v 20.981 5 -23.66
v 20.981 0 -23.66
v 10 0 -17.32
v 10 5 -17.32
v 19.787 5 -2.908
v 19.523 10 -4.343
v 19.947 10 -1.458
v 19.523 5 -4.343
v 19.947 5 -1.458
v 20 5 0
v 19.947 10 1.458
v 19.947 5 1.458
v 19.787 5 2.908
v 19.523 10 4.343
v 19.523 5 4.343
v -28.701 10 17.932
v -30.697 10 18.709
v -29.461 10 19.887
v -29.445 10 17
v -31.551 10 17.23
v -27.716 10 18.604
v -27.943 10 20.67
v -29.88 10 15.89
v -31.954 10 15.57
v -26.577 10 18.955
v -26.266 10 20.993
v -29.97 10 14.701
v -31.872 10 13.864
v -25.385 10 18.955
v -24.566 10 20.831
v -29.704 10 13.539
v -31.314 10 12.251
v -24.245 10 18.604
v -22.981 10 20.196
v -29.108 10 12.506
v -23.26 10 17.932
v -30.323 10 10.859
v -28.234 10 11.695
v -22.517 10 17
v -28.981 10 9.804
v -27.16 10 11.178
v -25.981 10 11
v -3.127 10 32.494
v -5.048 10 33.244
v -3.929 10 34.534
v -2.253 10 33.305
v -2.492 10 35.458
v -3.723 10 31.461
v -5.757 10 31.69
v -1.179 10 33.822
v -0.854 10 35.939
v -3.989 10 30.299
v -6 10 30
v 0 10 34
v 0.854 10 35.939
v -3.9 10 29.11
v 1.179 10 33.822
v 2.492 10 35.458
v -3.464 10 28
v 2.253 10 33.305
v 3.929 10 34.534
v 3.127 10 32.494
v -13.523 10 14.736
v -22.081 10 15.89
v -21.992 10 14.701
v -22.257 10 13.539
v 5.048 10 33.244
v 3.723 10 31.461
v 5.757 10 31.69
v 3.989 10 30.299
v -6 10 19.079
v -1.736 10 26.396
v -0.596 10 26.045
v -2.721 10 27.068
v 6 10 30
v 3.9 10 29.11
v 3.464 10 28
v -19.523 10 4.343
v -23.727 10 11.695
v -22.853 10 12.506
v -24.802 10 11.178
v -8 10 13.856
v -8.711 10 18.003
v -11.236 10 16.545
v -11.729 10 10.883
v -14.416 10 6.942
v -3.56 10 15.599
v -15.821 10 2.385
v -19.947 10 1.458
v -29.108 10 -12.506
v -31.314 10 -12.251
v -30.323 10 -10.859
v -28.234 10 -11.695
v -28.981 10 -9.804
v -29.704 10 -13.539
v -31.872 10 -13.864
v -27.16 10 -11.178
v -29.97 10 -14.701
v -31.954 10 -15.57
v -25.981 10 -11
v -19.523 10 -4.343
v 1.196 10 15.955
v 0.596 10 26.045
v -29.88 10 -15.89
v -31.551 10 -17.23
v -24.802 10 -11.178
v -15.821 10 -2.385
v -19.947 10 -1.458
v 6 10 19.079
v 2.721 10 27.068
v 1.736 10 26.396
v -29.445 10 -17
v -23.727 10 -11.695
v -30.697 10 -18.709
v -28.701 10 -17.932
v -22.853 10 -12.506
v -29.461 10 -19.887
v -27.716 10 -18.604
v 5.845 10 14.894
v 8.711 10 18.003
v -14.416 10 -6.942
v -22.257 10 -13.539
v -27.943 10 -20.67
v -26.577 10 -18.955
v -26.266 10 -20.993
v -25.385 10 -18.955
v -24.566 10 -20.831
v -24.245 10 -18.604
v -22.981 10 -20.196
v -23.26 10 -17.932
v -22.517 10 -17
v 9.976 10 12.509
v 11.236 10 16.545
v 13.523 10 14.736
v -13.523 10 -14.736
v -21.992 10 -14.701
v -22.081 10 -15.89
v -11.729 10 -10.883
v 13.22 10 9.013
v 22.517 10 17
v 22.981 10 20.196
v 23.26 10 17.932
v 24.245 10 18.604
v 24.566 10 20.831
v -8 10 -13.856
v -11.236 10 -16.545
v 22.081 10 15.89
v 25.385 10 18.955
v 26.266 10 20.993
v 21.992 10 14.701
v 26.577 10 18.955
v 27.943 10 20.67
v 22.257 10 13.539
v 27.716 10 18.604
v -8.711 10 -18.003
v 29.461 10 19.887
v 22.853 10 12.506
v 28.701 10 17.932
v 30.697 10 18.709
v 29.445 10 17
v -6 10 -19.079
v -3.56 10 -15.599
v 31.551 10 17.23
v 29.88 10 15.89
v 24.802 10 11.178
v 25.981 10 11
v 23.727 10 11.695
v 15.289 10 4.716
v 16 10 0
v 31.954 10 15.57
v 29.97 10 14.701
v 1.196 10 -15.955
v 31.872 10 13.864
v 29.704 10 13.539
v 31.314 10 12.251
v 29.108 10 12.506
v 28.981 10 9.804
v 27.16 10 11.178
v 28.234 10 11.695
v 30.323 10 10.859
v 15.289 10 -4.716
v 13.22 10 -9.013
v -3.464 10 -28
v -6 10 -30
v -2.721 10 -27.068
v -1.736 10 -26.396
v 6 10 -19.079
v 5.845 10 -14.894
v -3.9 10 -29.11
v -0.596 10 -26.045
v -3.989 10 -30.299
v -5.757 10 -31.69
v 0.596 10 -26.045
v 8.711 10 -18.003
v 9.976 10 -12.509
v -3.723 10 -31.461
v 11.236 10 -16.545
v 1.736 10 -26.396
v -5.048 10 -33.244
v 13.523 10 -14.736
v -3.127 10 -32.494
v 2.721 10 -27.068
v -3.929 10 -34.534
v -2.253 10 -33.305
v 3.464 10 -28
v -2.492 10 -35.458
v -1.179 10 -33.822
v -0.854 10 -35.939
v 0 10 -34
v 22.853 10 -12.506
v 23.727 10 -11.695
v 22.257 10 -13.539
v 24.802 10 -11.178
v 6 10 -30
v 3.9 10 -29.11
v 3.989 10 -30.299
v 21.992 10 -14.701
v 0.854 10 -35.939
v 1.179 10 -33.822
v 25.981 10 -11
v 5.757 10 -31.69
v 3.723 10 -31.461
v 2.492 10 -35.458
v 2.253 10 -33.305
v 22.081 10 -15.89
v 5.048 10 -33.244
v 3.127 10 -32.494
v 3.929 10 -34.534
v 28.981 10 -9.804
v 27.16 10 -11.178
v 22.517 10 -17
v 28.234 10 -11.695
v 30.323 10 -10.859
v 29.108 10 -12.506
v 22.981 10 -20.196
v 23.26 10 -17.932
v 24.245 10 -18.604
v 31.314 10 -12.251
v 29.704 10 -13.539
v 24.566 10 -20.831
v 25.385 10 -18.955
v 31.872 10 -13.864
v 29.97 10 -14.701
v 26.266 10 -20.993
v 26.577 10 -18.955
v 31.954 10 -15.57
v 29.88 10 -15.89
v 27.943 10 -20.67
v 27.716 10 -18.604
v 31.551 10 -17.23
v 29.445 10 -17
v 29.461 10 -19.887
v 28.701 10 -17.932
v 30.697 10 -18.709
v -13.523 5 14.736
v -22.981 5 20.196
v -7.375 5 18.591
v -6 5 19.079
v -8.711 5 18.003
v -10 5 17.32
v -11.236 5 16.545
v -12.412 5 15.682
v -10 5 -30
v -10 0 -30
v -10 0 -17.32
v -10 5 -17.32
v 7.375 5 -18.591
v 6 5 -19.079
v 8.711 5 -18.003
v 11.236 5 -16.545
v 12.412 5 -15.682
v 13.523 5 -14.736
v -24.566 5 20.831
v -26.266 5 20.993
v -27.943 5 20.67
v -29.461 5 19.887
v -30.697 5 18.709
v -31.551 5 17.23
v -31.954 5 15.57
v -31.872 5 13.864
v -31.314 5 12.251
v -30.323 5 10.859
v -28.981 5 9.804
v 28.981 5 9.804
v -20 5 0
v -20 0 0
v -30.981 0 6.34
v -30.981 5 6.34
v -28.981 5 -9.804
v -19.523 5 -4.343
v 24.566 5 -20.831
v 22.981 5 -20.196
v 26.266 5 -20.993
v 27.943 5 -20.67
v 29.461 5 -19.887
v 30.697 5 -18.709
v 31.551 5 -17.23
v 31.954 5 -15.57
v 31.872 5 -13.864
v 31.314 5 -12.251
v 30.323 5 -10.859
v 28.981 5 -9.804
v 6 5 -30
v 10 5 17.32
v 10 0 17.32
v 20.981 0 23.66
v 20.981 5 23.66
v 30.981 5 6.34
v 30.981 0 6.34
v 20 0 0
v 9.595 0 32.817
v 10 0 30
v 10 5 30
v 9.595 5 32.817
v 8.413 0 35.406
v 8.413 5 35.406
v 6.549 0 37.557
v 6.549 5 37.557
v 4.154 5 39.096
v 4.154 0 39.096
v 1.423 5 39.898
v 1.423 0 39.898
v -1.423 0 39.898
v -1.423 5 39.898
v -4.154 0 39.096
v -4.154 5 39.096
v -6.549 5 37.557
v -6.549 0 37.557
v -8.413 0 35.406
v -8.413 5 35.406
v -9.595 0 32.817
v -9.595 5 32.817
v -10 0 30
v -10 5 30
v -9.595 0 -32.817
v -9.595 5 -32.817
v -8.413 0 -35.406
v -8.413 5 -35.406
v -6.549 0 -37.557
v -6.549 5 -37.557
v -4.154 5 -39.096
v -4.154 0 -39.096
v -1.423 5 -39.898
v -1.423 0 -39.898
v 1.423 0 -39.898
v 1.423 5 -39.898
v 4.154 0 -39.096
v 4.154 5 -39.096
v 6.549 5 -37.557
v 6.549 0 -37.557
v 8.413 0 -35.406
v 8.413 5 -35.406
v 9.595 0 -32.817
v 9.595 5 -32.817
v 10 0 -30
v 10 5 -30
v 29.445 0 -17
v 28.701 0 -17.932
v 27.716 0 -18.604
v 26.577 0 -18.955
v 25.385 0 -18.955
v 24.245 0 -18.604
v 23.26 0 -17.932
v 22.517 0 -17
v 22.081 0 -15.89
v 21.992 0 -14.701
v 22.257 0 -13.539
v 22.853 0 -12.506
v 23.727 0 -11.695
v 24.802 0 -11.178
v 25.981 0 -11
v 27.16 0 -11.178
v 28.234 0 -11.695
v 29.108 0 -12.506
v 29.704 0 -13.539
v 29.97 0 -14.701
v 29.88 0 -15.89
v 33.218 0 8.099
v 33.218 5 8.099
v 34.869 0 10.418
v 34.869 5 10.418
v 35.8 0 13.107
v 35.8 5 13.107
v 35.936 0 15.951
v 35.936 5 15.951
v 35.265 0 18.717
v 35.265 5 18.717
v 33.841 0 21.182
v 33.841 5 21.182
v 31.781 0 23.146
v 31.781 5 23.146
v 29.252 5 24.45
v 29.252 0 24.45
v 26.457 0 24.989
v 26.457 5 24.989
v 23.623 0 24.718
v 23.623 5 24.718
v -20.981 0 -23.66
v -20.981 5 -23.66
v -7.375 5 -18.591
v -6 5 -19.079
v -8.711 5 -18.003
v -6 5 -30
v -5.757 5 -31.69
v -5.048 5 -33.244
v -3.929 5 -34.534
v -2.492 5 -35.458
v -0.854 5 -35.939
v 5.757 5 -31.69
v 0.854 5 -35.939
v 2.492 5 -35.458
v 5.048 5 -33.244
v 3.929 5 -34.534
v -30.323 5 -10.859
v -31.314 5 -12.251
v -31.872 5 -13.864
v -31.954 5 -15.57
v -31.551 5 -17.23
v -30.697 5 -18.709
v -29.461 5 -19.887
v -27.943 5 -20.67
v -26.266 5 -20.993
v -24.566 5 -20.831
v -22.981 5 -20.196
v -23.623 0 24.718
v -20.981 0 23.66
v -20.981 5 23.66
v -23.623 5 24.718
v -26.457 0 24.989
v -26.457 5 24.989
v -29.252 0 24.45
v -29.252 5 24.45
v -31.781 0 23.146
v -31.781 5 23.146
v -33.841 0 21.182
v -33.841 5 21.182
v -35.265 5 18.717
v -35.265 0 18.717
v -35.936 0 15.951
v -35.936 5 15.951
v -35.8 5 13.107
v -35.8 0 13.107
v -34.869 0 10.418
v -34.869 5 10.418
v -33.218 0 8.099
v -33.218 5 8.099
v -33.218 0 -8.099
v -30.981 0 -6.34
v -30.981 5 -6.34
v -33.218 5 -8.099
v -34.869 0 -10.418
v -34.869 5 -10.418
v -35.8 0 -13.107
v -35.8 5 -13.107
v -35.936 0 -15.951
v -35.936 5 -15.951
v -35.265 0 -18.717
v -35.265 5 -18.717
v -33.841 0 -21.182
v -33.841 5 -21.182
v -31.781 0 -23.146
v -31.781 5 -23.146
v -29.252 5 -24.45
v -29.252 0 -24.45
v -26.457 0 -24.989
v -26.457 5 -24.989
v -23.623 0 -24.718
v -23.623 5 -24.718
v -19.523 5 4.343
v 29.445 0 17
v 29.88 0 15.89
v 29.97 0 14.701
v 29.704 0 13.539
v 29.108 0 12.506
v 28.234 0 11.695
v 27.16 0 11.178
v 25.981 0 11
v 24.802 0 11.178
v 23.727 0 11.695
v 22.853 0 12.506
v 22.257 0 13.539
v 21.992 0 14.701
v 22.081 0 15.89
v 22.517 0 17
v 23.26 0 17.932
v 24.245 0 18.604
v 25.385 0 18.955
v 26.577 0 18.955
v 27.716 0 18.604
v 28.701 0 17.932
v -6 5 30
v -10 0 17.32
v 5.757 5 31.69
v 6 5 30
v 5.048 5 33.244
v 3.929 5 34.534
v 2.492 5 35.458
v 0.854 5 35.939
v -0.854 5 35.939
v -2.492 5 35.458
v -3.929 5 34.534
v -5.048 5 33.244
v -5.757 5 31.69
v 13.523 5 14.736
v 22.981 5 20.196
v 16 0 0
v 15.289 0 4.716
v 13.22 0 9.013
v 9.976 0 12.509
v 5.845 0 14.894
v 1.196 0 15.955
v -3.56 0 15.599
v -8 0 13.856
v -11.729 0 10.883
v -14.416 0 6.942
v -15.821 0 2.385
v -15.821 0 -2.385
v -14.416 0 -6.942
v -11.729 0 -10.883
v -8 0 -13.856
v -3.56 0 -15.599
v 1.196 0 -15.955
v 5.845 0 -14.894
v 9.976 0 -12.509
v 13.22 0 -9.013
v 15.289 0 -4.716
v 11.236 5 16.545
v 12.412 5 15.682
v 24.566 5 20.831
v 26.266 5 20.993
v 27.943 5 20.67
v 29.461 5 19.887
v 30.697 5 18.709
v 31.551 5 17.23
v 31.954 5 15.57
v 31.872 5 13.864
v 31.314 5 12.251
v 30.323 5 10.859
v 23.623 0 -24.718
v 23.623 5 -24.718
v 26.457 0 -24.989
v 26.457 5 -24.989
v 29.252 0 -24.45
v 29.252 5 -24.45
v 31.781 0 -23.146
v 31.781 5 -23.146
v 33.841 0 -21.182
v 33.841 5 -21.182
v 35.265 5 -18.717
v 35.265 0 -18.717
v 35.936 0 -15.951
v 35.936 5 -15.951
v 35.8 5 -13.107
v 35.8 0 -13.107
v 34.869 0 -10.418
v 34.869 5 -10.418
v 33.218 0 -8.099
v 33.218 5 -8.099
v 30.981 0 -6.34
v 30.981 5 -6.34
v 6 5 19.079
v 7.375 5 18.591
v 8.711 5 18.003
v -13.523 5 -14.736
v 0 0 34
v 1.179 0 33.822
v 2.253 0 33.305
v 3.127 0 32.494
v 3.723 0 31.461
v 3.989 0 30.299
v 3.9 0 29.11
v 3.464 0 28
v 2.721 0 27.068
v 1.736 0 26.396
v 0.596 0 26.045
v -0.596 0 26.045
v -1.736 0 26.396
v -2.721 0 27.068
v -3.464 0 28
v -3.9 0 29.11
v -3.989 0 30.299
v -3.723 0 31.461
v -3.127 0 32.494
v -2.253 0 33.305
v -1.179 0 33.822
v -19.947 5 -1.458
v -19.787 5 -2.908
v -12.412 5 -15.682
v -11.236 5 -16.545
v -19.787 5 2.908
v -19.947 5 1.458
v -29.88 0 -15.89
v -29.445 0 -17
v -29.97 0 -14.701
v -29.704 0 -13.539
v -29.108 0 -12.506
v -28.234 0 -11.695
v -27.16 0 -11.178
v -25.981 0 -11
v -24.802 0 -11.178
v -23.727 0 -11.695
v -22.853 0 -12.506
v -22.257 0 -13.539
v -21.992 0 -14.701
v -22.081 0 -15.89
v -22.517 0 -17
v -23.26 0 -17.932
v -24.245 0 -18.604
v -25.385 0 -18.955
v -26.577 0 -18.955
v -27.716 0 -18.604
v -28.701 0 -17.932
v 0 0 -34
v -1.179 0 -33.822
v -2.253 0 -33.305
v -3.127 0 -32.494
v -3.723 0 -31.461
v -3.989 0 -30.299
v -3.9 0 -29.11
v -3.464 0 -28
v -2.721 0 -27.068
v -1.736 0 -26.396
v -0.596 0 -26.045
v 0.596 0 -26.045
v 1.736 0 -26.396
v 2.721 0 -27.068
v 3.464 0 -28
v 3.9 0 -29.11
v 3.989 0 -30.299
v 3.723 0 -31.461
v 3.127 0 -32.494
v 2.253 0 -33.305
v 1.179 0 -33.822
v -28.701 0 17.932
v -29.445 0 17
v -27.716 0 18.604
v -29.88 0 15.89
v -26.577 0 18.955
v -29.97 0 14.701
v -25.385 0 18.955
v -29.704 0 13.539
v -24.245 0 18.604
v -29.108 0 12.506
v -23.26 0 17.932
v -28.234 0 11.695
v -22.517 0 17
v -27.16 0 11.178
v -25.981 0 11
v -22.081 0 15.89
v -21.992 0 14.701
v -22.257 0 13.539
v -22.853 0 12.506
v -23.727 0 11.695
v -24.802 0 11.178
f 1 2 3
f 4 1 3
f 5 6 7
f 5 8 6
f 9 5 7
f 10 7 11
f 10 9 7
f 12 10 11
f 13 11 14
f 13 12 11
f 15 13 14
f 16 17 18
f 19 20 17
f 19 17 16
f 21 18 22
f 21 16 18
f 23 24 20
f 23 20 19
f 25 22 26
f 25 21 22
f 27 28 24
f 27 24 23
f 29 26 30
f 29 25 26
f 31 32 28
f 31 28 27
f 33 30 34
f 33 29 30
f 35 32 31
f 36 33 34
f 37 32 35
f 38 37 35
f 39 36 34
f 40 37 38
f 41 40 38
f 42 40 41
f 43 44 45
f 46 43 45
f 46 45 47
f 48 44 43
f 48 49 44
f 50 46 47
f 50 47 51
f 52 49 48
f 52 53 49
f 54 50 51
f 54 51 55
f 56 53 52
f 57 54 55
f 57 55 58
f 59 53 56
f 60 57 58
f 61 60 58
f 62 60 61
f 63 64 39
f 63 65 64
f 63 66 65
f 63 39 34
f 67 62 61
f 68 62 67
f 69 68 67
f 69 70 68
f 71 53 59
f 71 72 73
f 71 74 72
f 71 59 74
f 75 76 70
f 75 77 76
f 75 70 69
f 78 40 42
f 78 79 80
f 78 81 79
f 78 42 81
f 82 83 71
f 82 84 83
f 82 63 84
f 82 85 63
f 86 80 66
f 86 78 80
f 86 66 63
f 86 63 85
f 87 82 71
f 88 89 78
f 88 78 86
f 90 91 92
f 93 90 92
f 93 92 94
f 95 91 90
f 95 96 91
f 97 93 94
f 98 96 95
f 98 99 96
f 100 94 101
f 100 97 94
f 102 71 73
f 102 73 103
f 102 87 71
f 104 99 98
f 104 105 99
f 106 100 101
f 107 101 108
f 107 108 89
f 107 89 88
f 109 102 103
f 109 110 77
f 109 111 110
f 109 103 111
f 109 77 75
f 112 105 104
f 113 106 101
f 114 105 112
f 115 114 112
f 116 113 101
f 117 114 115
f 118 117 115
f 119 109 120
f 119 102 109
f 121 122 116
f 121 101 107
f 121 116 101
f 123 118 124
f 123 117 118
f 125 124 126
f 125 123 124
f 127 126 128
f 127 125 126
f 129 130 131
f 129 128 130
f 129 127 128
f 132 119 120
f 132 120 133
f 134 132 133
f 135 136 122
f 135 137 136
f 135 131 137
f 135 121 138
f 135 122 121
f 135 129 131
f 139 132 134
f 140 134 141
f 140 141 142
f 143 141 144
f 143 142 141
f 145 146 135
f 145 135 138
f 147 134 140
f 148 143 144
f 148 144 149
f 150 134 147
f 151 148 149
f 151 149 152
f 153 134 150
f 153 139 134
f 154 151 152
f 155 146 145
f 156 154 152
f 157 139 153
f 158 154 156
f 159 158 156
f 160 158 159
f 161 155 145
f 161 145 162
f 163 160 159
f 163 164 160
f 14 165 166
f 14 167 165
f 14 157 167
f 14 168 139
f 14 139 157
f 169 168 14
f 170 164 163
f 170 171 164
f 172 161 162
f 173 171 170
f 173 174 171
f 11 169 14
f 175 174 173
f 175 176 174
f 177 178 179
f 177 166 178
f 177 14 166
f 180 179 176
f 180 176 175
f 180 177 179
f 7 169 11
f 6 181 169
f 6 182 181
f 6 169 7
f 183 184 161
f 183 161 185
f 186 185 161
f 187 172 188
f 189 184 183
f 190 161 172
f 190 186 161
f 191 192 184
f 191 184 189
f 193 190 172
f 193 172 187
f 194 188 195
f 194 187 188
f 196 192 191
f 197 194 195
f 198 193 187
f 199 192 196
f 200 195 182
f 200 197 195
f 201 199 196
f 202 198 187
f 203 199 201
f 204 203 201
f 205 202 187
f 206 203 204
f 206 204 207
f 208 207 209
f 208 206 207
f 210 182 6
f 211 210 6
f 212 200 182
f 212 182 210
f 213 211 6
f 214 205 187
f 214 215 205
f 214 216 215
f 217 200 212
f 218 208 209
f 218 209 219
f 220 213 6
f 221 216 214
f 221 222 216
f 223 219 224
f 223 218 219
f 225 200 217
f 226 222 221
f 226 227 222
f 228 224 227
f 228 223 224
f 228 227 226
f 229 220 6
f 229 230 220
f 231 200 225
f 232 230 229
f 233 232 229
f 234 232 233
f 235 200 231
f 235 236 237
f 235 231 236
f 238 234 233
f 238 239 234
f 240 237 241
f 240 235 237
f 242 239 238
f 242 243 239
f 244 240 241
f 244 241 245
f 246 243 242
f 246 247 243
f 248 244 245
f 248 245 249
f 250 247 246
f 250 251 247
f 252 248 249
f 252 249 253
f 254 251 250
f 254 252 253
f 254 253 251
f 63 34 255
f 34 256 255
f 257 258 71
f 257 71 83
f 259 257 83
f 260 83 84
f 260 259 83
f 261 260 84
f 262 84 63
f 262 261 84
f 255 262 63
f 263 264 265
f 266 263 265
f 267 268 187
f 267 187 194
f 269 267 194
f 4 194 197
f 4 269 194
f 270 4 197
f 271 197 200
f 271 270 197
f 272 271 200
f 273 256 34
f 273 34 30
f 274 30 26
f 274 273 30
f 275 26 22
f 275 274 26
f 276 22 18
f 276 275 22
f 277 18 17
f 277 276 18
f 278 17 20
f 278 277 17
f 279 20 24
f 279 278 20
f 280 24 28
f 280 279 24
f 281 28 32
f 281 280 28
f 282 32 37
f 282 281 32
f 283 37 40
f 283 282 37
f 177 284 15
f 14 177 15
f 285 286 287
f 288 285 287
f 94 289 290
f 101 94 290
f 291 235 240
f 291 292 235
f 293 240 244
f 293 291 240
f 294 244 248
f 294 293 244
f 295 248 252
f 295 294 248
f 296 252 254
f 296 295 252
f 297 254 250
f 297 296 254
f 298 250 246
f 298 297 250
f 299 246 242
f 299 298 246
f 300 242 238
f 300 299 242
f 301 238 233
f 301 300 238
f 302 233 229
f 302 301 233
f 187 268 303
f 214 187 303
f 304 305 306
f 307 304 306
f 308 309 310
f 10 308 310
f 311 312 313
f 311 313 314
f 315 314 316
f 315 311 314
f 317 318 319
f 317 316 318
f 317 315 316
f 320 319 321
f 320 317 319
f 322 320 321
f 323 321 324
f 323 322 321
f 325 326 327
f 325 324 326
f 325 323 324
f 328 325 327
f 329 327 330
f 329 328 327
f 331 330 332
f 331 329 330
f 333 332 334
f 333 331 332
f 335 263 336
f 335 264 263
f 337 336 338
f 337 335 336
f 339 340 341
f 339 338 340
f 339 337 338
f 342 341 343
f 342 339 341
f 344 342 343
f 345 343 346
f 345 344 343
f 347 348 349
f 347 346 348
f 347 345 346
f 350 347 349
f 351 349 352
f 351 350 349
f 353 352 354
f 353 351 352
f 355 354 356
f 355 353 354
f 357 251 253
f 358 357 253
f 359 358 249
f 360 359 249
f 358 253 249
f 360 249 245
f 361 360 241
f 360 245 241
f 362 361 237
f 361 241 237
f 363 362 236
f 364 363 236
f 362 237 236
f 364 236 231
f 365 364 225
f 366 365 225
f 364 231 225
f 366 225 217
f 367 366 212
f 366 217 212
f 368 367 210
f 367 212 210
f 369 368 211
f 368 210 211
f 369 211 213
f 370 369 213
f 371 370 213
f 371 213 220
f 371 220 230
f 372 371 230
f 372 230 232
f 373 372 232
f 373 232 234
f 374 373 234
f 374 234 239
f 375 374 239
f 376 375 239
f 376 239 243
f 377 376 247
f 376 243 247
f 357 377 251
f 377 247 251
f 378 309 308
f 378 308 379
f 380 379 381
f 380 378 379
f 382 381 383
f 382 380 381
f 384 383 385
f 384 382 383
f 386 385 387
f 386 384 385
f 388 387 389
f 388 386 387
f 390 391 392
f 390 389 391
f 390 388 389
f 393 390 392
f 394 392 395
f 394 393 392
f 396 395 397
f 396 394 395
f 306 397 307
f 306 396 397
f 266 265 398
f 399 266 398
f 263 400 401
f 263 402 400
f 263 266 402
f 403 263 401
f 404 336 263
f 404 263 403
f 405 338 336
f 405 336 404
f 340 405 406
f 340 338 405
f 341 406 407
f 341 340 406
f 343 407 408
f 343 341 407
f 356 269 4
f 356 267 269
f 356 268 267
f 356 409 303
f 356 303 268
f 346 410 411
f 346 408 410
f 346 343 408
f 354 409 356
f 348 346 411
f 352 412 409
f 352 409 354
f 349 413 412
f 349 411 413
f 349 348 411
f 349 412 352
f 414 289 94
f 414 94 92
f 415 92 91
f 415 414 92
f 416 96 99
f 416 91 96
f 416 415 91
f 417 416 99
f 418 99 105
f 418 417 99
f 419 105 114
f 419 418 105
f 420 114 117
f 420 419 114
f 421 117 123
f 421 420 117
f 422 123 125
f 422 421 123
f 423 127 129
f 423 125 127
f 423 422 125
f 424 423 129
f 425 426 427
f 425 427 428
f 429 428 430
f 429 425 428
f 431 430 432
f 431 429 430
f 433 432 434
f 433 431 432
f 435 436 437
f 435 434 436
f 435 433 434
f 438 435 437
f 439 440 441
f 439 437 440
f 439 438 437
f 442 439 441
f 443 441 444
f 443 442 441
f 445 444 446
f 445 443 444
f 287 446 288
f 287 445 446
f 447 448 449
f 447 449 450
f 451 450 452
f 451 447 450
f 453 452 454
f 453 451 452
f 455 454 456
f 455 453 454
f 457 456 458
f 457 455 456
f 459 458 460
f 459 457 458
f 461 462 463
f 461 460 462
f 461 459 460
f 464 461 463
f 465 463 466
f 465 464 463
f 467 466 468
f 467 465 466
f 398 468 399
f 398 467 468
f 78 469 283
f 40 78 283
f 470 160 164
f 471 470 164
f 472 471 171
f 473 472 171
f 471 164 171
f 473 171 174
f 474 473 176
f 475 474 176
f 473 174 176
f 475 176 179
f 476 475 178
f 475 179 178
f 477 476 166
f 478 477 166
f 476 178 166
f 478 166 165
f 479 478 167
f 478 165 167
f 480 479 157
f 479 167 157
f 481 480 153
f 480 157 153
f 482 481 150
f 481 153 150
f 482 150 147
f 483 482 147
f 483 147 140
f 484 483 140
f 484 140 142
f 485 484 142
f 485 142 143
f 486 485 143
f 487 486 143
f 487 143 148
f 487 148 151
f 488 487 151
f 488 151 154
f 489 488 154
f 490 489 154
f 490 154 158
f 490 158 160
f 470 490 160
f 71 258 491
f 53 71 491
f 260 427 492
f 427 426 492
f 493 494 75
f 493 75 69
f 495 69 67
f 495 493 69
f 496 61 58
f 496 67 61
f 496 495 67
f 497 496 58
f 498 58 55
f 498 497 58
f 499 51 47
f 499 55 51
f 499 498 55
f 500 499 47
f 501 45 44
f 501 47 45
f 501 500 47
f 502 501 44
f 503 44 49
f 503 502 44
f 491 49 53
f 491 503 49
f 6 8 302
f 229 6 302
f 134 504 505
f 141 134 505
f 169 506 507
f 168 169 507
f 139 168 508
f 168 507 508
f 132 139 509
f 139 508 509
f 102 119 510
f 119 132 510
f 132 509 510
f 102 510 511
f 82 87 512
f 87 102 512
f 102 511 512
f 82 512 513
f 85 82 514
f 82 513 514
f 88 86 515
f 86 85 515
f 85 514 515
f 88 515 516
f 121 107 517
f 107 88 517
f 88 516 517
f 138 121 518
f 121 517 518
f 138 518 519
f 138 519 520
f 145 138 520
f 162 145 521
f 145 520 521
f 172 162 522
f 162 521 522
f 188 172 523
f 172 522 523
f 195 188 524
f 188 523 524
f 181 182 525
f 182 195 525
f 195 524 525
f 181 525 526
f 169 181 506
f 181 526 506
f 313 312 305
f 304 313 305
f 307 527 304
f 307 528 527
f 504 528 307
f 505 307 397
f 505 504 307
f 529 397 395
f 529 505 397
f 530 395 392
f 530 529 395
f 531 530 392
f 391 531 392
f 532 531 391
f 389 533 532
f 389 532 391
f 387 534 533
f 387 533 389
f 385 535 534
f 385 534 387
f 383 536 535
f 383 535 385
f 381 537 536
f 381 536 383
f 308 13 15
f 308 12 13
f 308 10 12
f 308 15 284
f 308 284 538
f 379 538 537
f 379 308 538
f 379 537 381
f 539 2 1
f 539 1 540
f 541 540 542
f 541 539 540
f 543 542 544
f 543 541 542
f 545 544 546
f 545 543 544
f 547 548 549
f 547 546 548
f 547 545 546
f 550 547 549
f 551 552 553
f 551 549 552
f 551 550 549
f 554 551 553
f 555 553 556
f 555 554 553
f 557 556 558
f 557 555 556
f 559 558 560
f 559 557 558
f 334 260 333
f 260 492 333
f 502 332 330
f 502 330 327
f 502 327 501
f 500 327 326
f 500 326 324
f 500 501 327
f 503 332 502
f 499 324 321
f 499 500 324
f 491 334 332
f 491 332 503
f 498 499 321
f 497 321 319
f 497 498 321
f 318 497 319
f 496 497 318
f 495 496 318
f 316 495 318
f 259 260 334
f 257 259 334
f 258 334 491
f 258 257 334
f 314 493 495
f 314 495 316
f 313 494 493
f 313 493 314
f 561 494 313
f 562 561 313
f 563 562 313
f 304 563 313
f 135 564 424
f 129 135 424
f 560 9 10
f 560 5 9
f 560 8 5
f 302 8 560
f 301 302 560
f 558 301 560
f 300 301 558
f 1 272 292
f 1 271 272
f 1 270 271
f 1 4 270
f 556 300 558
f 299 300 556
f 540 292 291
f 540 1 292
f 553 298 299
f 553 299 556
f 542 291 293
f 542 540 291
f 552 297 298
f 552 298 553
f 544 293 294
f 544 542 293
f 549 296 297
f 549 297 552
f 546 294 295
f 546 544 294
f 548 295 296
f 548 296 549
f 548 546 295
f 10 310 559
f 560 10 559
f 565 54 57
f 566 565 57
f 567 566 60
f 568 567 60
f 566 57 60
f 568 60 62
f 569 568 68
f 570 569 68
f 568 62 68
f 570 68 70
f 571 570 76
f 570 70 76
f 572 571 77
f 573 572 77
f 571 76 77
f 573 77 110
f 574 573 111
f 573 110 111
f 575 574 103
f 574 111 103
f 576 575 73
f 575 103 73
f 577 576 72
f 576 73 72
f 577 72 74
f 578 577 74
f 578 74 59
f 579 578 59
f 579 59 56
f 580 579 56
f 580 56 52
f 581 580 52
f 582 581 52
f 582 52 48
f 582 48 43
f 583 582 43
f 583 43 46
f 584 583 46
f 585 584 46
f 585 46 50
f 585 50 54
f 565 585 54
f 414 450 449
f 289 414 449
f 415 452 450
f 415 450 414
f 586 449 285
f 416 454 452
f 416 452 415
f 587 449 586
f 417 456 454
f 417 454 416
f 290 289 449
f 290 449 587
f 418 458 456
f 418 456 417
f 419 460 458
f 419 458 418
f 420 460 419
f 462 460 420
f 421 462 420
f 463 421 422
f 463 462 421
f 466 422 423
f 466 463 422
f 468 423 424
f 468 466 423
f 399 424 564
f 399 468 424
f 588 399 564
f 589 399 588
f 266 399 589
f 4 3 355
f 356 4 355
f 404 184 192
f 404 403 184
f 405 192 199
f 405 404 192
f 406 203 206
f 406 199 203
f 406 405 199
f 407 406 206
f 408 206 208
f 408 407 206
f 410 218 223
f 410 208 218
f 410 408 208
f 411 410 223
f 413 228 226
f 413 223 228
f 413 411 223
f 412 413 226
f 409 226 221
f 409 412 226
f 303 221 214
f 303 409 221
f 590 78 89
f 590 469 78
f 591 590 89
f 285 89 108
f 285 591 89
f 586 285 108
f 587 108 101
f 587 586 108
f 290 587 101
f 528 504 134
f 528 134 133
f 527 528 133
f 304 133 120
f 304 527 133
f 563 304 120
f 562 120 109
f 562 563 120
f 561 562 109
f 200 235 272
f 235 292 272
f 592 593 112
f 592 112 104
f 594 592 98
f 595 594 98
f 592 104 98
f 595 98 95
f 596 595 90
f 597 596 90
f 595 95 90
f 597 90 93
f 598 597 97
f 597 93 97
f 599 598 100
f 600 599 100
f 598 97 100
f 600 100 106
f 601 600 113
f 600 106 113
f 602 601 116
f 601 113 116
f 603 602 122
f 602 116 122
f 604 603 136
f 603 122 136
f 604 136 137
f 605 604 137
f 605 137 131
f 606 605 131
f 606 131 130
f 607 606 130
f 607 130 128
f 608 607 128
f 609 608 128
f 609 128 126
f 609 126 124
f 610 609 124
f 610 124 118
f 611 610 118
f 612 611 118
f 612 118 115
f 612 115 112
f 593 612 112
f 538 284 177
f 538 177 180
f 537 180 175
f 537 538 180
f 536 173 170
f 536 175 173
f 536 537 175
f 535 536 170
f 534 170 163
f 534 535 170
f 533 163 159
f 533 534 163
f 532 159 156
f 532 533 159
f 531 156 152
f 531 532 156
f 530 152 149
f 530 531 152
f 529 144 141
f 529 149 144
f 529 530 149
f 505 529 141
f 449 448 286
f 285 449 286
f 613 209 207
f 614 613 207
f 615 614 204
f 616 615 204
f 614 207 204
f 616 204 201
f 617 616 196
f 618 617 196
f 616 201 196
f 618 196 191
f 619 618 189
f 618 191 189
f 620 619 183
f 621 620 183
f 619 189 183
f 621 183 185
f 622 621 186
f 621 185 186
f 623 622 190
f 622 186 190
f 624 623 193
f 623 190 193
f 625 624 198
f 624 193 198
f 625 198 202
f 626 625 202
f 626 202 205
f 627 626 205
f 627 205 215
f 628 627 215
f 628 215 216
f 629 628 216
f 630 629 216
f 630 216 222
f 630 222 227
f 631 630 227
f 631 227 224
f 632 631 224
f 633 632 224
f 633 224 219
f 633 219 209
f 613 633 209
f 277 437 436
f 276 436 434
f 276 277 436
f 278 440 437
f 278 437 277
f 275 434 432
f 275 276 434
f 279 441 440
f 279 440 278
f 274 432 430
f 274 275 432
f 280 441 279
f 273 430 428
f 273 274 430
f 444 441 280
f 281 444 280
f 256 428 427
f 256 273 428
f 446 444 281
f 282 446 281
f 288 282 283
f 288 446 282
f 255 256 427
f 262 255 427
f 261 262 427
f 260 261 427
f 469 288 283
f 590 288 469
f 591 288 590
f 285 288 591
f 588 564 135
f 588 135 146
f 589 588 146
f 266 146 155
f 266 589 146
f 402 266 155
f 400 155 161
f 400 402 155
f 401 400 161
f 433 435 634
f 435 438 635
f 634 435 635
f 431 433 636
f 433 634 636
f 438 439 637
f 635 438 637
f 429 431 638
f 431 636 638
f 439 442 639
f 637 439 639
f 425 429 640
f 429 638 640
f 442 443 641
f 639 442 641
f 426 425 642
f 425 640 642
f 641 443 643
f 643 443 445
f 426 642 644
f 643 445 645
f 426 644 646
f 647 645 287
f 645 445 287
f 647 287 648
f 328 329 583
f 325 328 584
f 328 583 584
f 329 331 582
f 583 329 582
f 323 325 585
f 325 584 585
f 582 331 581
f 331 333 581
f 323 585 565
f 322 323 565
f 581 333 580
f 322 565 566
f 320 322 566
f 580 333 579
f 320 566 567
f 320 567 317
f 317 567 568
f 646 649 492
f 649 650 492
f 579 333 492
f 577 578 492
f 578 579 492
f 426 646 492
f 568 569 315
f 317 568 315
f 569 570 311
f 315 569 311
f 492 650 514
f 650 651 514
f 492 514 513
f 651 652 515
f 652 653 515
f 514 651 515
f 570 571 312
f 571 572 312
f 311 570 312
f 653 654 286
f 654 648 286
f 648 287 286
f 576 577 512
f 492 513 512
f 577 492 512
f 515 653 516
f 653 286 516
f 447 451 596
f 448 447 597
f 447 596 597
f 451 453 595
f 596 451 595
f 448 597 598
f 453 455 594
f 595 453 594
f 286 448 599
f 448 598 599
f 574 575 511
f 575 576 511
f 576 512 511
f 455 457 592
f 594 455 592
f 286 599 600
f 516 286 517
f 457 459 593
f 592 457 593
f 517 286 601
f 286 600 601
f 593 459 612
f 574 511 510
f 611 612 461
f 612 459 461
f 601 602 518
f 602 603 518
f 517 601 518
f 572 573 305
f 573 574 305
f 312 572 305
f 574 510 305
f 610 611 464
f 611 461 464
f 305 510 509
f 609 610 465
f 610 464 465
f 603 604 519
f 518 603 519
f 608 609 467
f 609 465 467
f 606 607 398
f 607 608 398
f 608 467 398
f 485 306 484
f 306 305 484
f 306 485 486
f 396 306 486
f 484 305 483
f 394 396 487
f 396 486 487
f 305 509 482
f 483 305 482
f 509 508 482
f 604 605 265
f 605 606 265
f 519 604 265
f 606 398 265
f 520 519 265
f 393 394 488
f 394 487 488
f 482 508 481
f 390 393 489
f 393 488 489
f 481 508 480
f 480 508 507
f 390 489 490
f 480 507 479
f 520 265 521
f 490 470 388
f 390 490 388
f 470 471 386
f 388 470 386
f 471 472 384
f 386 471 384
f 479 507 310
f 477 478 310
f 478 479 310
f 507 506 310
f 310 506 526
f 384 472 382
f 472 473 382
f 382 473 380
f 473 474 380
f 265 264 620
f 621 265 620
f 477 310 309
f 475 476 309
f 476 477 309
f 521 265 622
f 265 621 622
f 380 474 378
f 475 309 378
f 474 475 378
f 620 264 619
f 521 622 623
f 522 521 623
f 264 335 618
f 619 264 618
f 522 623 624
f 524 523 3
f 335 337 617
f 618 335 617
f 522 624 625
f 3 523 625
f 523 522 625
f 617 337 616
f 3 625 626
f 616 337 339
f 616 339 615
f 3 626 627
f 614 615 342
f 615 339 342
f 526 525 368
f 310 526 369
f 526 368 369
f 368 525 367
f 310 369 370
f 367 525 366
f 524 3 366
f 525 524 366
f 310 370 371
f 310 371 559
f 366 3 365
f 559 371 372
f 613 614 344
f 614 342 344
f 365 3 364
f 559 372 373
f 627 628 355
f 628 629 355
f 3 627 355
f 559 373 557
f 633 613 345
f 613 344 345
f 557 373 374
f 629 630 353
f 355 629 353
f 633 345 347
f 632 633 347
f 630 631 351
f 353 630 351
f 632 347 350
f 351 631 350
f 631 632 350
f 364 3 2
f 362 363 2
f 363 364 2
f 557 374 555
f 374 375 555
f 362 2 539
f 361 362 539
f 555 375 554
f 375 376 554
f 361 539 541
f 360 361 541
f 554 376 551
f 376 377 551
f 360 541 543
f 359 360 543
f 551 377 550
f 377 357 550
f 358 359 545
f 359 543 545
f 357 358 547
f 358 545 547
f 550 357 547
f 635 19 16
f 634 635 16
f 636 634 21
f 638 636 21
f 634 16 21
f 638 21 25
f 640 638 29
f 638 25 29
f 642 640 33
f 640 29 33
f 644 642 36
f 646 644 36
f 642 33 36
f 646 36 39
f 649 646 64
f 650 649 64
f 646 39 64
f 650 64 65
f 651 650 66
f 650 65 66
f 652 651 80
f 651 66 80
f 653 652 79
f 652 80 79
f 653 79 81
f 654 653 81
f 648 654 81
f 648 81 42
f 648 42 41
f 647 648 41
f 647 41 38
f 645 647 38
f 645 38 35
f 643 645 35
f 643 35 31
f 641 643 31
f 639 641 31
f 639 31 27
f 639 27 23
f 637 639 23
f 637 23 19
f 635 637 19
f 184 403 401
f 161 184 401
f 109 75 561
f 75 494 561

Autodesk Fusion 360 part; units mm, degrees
sketch "Sketch1" plane through (0, 0, 0) normal (0, 1, 0) x (1, 0, 0)
  circle A0 centre (0, 0) radius 16
  circle A1 centre (0, 0) radius 30 construction
  arc A2 (-6, -30) -> (6, -30) centre (0, -30) ccw
  arc A3 (6, 30) -> (-6, 30) centre (0, 30) ccw
  arc A4 (-10, -30) -> (10, -30) centre (0, -30) ccw
  arc A5 (10, 30) -> (-10, 30) centre (0, 30) ccw
  circle A6 centre (0, 0) radius 20
  line L0 (-10, 30) -> (-10, 17.3205)
  line L1 (-10, -17.3205) -> (-10, -30)
  line L2 (-6, 30) -> (-6, 19.0788)
  line L3 (-6, -19.0788) -> (-6, -30)
  line L4 (0, 30) -> (0, 20) construction
  line L5 (0, -16) -> (0, -30) construction
  line L6 (6, -30) -> (6, -19.0788)
  line L7 (6, 19.0788) -> (6, 30)
  line L8 (10, -30) -> (10, -17.3205)
  line L9 (10, 17.3205) -> (10, 30)
  line L10 (-20, 0) -> (-30.9808, -6.3397)
  line L11 (-19.5227, -4.3432) -> (-28.9808, -9.8038)
  line L12 (-22.9808, -20.1962) -> (-13.5227, -14.7355)
  line L13 (-20.9808, -23.6603) -> (-10, -17.3205)
  arc A7 (-30.9808, -6.3397) -> (-20.9808, -23.6603) centre (-25.9808, -15) ccw
  arc A8 (-28.9808, -9.8038) -> (-22.9808, -20.1962) centre (-25.9808, -15) ccw
  line L14 (20, 0) -> (30.9808, 6.3397)
  line L15 (19.5227, 4.3432) -> (28.9808, 9.8038)
  line L16 (22.9808, 20.1962) -> (13.5227, 14.7355)
  line L17 (20.9808, 23.6603) -> (10, 17.3205)
  arc A9 (30.9808, 6.3397) -> (20.9808, 23.6603) centre (25.9808, 15) ccw
  arc A10 (28.9808, 9.8038) -> (22.9808, 20.1962) centre (25.9808, 15) ccw
  line L18 (10, -17.3205) -> (20.9808, -23.6603)
  line L19 (13.5227, -14.7355) -> (22.9808, -20.1962)
  line L20 (28.9808, -9.8038) -> (19.5227, -4.3432)
  line L21 (30.9808, -6.3397) -> (20, 0)
  arc A11 (20.9808, -23.6603) -> (30.9808, -6.3397) centre (25.9808, -15) ccw
  arc A12 (22.9808, -20.1962) -> (28.9808, -9.8038) centre (25.9808, -15) ccw
  line L22 (-10, 17.3205) -> (-20.9808, 23.6603)
  line L23 (-13.5227, 14.7355) -> (-22.9808, 20.1962)
  line L24 (-28.9808, 9.8038) -> (-19.5227, 4.3432)
  line L25 (-30.9808, 6.3397) -> (-20, 0)
  arc A13 (-20.9808, 23.6603) -> (-30.9808, 6.3397) centre (-25.9808, 15) ccw
  arc A14 (-22.9808, 20.1962) -> (-28.9808, 9.8038) centre (-25.9808, 15) ccw
  dimension "d1" = 32
  dimension "d2" = 60
  dimension "d3" = 12
  dimension "d5" = 40
  dimension "d7" = 360
extrude "Extrude1" add sketch "Sketch1" along normal blind 10 contours A2 A6 L3 L6 | A6 | A6 L11 L12 A8 | A6 L19 L20 A12 | A6 L23 L24 A14 | A6 L15 L16 A10 | A3 A6 L2 L7
extrude "Extrude2" add sketch "Sketch1" along normal blind 5 contours A2 A4 A6 L1 L3 L6 L8 | A6 L10 L11 L12 L13 A7 A8 | A6 L18 L19 L20 L21 A11 A12 | A6 L22 L23 L24 L25 A13 A14 | A6 L14 L15 L16 L17 A9 A10 | A3 A5 A6 L0 L2 L7 L9
hole "Hole1" at (0, 0, -30) direction (0, 1, 0) diameter 8 end through all
pattern_circular "C-Pattern1" count 6 over 360 about axis through (0, 1.75, 0) along (0, 1, 0) of "Hole1"
